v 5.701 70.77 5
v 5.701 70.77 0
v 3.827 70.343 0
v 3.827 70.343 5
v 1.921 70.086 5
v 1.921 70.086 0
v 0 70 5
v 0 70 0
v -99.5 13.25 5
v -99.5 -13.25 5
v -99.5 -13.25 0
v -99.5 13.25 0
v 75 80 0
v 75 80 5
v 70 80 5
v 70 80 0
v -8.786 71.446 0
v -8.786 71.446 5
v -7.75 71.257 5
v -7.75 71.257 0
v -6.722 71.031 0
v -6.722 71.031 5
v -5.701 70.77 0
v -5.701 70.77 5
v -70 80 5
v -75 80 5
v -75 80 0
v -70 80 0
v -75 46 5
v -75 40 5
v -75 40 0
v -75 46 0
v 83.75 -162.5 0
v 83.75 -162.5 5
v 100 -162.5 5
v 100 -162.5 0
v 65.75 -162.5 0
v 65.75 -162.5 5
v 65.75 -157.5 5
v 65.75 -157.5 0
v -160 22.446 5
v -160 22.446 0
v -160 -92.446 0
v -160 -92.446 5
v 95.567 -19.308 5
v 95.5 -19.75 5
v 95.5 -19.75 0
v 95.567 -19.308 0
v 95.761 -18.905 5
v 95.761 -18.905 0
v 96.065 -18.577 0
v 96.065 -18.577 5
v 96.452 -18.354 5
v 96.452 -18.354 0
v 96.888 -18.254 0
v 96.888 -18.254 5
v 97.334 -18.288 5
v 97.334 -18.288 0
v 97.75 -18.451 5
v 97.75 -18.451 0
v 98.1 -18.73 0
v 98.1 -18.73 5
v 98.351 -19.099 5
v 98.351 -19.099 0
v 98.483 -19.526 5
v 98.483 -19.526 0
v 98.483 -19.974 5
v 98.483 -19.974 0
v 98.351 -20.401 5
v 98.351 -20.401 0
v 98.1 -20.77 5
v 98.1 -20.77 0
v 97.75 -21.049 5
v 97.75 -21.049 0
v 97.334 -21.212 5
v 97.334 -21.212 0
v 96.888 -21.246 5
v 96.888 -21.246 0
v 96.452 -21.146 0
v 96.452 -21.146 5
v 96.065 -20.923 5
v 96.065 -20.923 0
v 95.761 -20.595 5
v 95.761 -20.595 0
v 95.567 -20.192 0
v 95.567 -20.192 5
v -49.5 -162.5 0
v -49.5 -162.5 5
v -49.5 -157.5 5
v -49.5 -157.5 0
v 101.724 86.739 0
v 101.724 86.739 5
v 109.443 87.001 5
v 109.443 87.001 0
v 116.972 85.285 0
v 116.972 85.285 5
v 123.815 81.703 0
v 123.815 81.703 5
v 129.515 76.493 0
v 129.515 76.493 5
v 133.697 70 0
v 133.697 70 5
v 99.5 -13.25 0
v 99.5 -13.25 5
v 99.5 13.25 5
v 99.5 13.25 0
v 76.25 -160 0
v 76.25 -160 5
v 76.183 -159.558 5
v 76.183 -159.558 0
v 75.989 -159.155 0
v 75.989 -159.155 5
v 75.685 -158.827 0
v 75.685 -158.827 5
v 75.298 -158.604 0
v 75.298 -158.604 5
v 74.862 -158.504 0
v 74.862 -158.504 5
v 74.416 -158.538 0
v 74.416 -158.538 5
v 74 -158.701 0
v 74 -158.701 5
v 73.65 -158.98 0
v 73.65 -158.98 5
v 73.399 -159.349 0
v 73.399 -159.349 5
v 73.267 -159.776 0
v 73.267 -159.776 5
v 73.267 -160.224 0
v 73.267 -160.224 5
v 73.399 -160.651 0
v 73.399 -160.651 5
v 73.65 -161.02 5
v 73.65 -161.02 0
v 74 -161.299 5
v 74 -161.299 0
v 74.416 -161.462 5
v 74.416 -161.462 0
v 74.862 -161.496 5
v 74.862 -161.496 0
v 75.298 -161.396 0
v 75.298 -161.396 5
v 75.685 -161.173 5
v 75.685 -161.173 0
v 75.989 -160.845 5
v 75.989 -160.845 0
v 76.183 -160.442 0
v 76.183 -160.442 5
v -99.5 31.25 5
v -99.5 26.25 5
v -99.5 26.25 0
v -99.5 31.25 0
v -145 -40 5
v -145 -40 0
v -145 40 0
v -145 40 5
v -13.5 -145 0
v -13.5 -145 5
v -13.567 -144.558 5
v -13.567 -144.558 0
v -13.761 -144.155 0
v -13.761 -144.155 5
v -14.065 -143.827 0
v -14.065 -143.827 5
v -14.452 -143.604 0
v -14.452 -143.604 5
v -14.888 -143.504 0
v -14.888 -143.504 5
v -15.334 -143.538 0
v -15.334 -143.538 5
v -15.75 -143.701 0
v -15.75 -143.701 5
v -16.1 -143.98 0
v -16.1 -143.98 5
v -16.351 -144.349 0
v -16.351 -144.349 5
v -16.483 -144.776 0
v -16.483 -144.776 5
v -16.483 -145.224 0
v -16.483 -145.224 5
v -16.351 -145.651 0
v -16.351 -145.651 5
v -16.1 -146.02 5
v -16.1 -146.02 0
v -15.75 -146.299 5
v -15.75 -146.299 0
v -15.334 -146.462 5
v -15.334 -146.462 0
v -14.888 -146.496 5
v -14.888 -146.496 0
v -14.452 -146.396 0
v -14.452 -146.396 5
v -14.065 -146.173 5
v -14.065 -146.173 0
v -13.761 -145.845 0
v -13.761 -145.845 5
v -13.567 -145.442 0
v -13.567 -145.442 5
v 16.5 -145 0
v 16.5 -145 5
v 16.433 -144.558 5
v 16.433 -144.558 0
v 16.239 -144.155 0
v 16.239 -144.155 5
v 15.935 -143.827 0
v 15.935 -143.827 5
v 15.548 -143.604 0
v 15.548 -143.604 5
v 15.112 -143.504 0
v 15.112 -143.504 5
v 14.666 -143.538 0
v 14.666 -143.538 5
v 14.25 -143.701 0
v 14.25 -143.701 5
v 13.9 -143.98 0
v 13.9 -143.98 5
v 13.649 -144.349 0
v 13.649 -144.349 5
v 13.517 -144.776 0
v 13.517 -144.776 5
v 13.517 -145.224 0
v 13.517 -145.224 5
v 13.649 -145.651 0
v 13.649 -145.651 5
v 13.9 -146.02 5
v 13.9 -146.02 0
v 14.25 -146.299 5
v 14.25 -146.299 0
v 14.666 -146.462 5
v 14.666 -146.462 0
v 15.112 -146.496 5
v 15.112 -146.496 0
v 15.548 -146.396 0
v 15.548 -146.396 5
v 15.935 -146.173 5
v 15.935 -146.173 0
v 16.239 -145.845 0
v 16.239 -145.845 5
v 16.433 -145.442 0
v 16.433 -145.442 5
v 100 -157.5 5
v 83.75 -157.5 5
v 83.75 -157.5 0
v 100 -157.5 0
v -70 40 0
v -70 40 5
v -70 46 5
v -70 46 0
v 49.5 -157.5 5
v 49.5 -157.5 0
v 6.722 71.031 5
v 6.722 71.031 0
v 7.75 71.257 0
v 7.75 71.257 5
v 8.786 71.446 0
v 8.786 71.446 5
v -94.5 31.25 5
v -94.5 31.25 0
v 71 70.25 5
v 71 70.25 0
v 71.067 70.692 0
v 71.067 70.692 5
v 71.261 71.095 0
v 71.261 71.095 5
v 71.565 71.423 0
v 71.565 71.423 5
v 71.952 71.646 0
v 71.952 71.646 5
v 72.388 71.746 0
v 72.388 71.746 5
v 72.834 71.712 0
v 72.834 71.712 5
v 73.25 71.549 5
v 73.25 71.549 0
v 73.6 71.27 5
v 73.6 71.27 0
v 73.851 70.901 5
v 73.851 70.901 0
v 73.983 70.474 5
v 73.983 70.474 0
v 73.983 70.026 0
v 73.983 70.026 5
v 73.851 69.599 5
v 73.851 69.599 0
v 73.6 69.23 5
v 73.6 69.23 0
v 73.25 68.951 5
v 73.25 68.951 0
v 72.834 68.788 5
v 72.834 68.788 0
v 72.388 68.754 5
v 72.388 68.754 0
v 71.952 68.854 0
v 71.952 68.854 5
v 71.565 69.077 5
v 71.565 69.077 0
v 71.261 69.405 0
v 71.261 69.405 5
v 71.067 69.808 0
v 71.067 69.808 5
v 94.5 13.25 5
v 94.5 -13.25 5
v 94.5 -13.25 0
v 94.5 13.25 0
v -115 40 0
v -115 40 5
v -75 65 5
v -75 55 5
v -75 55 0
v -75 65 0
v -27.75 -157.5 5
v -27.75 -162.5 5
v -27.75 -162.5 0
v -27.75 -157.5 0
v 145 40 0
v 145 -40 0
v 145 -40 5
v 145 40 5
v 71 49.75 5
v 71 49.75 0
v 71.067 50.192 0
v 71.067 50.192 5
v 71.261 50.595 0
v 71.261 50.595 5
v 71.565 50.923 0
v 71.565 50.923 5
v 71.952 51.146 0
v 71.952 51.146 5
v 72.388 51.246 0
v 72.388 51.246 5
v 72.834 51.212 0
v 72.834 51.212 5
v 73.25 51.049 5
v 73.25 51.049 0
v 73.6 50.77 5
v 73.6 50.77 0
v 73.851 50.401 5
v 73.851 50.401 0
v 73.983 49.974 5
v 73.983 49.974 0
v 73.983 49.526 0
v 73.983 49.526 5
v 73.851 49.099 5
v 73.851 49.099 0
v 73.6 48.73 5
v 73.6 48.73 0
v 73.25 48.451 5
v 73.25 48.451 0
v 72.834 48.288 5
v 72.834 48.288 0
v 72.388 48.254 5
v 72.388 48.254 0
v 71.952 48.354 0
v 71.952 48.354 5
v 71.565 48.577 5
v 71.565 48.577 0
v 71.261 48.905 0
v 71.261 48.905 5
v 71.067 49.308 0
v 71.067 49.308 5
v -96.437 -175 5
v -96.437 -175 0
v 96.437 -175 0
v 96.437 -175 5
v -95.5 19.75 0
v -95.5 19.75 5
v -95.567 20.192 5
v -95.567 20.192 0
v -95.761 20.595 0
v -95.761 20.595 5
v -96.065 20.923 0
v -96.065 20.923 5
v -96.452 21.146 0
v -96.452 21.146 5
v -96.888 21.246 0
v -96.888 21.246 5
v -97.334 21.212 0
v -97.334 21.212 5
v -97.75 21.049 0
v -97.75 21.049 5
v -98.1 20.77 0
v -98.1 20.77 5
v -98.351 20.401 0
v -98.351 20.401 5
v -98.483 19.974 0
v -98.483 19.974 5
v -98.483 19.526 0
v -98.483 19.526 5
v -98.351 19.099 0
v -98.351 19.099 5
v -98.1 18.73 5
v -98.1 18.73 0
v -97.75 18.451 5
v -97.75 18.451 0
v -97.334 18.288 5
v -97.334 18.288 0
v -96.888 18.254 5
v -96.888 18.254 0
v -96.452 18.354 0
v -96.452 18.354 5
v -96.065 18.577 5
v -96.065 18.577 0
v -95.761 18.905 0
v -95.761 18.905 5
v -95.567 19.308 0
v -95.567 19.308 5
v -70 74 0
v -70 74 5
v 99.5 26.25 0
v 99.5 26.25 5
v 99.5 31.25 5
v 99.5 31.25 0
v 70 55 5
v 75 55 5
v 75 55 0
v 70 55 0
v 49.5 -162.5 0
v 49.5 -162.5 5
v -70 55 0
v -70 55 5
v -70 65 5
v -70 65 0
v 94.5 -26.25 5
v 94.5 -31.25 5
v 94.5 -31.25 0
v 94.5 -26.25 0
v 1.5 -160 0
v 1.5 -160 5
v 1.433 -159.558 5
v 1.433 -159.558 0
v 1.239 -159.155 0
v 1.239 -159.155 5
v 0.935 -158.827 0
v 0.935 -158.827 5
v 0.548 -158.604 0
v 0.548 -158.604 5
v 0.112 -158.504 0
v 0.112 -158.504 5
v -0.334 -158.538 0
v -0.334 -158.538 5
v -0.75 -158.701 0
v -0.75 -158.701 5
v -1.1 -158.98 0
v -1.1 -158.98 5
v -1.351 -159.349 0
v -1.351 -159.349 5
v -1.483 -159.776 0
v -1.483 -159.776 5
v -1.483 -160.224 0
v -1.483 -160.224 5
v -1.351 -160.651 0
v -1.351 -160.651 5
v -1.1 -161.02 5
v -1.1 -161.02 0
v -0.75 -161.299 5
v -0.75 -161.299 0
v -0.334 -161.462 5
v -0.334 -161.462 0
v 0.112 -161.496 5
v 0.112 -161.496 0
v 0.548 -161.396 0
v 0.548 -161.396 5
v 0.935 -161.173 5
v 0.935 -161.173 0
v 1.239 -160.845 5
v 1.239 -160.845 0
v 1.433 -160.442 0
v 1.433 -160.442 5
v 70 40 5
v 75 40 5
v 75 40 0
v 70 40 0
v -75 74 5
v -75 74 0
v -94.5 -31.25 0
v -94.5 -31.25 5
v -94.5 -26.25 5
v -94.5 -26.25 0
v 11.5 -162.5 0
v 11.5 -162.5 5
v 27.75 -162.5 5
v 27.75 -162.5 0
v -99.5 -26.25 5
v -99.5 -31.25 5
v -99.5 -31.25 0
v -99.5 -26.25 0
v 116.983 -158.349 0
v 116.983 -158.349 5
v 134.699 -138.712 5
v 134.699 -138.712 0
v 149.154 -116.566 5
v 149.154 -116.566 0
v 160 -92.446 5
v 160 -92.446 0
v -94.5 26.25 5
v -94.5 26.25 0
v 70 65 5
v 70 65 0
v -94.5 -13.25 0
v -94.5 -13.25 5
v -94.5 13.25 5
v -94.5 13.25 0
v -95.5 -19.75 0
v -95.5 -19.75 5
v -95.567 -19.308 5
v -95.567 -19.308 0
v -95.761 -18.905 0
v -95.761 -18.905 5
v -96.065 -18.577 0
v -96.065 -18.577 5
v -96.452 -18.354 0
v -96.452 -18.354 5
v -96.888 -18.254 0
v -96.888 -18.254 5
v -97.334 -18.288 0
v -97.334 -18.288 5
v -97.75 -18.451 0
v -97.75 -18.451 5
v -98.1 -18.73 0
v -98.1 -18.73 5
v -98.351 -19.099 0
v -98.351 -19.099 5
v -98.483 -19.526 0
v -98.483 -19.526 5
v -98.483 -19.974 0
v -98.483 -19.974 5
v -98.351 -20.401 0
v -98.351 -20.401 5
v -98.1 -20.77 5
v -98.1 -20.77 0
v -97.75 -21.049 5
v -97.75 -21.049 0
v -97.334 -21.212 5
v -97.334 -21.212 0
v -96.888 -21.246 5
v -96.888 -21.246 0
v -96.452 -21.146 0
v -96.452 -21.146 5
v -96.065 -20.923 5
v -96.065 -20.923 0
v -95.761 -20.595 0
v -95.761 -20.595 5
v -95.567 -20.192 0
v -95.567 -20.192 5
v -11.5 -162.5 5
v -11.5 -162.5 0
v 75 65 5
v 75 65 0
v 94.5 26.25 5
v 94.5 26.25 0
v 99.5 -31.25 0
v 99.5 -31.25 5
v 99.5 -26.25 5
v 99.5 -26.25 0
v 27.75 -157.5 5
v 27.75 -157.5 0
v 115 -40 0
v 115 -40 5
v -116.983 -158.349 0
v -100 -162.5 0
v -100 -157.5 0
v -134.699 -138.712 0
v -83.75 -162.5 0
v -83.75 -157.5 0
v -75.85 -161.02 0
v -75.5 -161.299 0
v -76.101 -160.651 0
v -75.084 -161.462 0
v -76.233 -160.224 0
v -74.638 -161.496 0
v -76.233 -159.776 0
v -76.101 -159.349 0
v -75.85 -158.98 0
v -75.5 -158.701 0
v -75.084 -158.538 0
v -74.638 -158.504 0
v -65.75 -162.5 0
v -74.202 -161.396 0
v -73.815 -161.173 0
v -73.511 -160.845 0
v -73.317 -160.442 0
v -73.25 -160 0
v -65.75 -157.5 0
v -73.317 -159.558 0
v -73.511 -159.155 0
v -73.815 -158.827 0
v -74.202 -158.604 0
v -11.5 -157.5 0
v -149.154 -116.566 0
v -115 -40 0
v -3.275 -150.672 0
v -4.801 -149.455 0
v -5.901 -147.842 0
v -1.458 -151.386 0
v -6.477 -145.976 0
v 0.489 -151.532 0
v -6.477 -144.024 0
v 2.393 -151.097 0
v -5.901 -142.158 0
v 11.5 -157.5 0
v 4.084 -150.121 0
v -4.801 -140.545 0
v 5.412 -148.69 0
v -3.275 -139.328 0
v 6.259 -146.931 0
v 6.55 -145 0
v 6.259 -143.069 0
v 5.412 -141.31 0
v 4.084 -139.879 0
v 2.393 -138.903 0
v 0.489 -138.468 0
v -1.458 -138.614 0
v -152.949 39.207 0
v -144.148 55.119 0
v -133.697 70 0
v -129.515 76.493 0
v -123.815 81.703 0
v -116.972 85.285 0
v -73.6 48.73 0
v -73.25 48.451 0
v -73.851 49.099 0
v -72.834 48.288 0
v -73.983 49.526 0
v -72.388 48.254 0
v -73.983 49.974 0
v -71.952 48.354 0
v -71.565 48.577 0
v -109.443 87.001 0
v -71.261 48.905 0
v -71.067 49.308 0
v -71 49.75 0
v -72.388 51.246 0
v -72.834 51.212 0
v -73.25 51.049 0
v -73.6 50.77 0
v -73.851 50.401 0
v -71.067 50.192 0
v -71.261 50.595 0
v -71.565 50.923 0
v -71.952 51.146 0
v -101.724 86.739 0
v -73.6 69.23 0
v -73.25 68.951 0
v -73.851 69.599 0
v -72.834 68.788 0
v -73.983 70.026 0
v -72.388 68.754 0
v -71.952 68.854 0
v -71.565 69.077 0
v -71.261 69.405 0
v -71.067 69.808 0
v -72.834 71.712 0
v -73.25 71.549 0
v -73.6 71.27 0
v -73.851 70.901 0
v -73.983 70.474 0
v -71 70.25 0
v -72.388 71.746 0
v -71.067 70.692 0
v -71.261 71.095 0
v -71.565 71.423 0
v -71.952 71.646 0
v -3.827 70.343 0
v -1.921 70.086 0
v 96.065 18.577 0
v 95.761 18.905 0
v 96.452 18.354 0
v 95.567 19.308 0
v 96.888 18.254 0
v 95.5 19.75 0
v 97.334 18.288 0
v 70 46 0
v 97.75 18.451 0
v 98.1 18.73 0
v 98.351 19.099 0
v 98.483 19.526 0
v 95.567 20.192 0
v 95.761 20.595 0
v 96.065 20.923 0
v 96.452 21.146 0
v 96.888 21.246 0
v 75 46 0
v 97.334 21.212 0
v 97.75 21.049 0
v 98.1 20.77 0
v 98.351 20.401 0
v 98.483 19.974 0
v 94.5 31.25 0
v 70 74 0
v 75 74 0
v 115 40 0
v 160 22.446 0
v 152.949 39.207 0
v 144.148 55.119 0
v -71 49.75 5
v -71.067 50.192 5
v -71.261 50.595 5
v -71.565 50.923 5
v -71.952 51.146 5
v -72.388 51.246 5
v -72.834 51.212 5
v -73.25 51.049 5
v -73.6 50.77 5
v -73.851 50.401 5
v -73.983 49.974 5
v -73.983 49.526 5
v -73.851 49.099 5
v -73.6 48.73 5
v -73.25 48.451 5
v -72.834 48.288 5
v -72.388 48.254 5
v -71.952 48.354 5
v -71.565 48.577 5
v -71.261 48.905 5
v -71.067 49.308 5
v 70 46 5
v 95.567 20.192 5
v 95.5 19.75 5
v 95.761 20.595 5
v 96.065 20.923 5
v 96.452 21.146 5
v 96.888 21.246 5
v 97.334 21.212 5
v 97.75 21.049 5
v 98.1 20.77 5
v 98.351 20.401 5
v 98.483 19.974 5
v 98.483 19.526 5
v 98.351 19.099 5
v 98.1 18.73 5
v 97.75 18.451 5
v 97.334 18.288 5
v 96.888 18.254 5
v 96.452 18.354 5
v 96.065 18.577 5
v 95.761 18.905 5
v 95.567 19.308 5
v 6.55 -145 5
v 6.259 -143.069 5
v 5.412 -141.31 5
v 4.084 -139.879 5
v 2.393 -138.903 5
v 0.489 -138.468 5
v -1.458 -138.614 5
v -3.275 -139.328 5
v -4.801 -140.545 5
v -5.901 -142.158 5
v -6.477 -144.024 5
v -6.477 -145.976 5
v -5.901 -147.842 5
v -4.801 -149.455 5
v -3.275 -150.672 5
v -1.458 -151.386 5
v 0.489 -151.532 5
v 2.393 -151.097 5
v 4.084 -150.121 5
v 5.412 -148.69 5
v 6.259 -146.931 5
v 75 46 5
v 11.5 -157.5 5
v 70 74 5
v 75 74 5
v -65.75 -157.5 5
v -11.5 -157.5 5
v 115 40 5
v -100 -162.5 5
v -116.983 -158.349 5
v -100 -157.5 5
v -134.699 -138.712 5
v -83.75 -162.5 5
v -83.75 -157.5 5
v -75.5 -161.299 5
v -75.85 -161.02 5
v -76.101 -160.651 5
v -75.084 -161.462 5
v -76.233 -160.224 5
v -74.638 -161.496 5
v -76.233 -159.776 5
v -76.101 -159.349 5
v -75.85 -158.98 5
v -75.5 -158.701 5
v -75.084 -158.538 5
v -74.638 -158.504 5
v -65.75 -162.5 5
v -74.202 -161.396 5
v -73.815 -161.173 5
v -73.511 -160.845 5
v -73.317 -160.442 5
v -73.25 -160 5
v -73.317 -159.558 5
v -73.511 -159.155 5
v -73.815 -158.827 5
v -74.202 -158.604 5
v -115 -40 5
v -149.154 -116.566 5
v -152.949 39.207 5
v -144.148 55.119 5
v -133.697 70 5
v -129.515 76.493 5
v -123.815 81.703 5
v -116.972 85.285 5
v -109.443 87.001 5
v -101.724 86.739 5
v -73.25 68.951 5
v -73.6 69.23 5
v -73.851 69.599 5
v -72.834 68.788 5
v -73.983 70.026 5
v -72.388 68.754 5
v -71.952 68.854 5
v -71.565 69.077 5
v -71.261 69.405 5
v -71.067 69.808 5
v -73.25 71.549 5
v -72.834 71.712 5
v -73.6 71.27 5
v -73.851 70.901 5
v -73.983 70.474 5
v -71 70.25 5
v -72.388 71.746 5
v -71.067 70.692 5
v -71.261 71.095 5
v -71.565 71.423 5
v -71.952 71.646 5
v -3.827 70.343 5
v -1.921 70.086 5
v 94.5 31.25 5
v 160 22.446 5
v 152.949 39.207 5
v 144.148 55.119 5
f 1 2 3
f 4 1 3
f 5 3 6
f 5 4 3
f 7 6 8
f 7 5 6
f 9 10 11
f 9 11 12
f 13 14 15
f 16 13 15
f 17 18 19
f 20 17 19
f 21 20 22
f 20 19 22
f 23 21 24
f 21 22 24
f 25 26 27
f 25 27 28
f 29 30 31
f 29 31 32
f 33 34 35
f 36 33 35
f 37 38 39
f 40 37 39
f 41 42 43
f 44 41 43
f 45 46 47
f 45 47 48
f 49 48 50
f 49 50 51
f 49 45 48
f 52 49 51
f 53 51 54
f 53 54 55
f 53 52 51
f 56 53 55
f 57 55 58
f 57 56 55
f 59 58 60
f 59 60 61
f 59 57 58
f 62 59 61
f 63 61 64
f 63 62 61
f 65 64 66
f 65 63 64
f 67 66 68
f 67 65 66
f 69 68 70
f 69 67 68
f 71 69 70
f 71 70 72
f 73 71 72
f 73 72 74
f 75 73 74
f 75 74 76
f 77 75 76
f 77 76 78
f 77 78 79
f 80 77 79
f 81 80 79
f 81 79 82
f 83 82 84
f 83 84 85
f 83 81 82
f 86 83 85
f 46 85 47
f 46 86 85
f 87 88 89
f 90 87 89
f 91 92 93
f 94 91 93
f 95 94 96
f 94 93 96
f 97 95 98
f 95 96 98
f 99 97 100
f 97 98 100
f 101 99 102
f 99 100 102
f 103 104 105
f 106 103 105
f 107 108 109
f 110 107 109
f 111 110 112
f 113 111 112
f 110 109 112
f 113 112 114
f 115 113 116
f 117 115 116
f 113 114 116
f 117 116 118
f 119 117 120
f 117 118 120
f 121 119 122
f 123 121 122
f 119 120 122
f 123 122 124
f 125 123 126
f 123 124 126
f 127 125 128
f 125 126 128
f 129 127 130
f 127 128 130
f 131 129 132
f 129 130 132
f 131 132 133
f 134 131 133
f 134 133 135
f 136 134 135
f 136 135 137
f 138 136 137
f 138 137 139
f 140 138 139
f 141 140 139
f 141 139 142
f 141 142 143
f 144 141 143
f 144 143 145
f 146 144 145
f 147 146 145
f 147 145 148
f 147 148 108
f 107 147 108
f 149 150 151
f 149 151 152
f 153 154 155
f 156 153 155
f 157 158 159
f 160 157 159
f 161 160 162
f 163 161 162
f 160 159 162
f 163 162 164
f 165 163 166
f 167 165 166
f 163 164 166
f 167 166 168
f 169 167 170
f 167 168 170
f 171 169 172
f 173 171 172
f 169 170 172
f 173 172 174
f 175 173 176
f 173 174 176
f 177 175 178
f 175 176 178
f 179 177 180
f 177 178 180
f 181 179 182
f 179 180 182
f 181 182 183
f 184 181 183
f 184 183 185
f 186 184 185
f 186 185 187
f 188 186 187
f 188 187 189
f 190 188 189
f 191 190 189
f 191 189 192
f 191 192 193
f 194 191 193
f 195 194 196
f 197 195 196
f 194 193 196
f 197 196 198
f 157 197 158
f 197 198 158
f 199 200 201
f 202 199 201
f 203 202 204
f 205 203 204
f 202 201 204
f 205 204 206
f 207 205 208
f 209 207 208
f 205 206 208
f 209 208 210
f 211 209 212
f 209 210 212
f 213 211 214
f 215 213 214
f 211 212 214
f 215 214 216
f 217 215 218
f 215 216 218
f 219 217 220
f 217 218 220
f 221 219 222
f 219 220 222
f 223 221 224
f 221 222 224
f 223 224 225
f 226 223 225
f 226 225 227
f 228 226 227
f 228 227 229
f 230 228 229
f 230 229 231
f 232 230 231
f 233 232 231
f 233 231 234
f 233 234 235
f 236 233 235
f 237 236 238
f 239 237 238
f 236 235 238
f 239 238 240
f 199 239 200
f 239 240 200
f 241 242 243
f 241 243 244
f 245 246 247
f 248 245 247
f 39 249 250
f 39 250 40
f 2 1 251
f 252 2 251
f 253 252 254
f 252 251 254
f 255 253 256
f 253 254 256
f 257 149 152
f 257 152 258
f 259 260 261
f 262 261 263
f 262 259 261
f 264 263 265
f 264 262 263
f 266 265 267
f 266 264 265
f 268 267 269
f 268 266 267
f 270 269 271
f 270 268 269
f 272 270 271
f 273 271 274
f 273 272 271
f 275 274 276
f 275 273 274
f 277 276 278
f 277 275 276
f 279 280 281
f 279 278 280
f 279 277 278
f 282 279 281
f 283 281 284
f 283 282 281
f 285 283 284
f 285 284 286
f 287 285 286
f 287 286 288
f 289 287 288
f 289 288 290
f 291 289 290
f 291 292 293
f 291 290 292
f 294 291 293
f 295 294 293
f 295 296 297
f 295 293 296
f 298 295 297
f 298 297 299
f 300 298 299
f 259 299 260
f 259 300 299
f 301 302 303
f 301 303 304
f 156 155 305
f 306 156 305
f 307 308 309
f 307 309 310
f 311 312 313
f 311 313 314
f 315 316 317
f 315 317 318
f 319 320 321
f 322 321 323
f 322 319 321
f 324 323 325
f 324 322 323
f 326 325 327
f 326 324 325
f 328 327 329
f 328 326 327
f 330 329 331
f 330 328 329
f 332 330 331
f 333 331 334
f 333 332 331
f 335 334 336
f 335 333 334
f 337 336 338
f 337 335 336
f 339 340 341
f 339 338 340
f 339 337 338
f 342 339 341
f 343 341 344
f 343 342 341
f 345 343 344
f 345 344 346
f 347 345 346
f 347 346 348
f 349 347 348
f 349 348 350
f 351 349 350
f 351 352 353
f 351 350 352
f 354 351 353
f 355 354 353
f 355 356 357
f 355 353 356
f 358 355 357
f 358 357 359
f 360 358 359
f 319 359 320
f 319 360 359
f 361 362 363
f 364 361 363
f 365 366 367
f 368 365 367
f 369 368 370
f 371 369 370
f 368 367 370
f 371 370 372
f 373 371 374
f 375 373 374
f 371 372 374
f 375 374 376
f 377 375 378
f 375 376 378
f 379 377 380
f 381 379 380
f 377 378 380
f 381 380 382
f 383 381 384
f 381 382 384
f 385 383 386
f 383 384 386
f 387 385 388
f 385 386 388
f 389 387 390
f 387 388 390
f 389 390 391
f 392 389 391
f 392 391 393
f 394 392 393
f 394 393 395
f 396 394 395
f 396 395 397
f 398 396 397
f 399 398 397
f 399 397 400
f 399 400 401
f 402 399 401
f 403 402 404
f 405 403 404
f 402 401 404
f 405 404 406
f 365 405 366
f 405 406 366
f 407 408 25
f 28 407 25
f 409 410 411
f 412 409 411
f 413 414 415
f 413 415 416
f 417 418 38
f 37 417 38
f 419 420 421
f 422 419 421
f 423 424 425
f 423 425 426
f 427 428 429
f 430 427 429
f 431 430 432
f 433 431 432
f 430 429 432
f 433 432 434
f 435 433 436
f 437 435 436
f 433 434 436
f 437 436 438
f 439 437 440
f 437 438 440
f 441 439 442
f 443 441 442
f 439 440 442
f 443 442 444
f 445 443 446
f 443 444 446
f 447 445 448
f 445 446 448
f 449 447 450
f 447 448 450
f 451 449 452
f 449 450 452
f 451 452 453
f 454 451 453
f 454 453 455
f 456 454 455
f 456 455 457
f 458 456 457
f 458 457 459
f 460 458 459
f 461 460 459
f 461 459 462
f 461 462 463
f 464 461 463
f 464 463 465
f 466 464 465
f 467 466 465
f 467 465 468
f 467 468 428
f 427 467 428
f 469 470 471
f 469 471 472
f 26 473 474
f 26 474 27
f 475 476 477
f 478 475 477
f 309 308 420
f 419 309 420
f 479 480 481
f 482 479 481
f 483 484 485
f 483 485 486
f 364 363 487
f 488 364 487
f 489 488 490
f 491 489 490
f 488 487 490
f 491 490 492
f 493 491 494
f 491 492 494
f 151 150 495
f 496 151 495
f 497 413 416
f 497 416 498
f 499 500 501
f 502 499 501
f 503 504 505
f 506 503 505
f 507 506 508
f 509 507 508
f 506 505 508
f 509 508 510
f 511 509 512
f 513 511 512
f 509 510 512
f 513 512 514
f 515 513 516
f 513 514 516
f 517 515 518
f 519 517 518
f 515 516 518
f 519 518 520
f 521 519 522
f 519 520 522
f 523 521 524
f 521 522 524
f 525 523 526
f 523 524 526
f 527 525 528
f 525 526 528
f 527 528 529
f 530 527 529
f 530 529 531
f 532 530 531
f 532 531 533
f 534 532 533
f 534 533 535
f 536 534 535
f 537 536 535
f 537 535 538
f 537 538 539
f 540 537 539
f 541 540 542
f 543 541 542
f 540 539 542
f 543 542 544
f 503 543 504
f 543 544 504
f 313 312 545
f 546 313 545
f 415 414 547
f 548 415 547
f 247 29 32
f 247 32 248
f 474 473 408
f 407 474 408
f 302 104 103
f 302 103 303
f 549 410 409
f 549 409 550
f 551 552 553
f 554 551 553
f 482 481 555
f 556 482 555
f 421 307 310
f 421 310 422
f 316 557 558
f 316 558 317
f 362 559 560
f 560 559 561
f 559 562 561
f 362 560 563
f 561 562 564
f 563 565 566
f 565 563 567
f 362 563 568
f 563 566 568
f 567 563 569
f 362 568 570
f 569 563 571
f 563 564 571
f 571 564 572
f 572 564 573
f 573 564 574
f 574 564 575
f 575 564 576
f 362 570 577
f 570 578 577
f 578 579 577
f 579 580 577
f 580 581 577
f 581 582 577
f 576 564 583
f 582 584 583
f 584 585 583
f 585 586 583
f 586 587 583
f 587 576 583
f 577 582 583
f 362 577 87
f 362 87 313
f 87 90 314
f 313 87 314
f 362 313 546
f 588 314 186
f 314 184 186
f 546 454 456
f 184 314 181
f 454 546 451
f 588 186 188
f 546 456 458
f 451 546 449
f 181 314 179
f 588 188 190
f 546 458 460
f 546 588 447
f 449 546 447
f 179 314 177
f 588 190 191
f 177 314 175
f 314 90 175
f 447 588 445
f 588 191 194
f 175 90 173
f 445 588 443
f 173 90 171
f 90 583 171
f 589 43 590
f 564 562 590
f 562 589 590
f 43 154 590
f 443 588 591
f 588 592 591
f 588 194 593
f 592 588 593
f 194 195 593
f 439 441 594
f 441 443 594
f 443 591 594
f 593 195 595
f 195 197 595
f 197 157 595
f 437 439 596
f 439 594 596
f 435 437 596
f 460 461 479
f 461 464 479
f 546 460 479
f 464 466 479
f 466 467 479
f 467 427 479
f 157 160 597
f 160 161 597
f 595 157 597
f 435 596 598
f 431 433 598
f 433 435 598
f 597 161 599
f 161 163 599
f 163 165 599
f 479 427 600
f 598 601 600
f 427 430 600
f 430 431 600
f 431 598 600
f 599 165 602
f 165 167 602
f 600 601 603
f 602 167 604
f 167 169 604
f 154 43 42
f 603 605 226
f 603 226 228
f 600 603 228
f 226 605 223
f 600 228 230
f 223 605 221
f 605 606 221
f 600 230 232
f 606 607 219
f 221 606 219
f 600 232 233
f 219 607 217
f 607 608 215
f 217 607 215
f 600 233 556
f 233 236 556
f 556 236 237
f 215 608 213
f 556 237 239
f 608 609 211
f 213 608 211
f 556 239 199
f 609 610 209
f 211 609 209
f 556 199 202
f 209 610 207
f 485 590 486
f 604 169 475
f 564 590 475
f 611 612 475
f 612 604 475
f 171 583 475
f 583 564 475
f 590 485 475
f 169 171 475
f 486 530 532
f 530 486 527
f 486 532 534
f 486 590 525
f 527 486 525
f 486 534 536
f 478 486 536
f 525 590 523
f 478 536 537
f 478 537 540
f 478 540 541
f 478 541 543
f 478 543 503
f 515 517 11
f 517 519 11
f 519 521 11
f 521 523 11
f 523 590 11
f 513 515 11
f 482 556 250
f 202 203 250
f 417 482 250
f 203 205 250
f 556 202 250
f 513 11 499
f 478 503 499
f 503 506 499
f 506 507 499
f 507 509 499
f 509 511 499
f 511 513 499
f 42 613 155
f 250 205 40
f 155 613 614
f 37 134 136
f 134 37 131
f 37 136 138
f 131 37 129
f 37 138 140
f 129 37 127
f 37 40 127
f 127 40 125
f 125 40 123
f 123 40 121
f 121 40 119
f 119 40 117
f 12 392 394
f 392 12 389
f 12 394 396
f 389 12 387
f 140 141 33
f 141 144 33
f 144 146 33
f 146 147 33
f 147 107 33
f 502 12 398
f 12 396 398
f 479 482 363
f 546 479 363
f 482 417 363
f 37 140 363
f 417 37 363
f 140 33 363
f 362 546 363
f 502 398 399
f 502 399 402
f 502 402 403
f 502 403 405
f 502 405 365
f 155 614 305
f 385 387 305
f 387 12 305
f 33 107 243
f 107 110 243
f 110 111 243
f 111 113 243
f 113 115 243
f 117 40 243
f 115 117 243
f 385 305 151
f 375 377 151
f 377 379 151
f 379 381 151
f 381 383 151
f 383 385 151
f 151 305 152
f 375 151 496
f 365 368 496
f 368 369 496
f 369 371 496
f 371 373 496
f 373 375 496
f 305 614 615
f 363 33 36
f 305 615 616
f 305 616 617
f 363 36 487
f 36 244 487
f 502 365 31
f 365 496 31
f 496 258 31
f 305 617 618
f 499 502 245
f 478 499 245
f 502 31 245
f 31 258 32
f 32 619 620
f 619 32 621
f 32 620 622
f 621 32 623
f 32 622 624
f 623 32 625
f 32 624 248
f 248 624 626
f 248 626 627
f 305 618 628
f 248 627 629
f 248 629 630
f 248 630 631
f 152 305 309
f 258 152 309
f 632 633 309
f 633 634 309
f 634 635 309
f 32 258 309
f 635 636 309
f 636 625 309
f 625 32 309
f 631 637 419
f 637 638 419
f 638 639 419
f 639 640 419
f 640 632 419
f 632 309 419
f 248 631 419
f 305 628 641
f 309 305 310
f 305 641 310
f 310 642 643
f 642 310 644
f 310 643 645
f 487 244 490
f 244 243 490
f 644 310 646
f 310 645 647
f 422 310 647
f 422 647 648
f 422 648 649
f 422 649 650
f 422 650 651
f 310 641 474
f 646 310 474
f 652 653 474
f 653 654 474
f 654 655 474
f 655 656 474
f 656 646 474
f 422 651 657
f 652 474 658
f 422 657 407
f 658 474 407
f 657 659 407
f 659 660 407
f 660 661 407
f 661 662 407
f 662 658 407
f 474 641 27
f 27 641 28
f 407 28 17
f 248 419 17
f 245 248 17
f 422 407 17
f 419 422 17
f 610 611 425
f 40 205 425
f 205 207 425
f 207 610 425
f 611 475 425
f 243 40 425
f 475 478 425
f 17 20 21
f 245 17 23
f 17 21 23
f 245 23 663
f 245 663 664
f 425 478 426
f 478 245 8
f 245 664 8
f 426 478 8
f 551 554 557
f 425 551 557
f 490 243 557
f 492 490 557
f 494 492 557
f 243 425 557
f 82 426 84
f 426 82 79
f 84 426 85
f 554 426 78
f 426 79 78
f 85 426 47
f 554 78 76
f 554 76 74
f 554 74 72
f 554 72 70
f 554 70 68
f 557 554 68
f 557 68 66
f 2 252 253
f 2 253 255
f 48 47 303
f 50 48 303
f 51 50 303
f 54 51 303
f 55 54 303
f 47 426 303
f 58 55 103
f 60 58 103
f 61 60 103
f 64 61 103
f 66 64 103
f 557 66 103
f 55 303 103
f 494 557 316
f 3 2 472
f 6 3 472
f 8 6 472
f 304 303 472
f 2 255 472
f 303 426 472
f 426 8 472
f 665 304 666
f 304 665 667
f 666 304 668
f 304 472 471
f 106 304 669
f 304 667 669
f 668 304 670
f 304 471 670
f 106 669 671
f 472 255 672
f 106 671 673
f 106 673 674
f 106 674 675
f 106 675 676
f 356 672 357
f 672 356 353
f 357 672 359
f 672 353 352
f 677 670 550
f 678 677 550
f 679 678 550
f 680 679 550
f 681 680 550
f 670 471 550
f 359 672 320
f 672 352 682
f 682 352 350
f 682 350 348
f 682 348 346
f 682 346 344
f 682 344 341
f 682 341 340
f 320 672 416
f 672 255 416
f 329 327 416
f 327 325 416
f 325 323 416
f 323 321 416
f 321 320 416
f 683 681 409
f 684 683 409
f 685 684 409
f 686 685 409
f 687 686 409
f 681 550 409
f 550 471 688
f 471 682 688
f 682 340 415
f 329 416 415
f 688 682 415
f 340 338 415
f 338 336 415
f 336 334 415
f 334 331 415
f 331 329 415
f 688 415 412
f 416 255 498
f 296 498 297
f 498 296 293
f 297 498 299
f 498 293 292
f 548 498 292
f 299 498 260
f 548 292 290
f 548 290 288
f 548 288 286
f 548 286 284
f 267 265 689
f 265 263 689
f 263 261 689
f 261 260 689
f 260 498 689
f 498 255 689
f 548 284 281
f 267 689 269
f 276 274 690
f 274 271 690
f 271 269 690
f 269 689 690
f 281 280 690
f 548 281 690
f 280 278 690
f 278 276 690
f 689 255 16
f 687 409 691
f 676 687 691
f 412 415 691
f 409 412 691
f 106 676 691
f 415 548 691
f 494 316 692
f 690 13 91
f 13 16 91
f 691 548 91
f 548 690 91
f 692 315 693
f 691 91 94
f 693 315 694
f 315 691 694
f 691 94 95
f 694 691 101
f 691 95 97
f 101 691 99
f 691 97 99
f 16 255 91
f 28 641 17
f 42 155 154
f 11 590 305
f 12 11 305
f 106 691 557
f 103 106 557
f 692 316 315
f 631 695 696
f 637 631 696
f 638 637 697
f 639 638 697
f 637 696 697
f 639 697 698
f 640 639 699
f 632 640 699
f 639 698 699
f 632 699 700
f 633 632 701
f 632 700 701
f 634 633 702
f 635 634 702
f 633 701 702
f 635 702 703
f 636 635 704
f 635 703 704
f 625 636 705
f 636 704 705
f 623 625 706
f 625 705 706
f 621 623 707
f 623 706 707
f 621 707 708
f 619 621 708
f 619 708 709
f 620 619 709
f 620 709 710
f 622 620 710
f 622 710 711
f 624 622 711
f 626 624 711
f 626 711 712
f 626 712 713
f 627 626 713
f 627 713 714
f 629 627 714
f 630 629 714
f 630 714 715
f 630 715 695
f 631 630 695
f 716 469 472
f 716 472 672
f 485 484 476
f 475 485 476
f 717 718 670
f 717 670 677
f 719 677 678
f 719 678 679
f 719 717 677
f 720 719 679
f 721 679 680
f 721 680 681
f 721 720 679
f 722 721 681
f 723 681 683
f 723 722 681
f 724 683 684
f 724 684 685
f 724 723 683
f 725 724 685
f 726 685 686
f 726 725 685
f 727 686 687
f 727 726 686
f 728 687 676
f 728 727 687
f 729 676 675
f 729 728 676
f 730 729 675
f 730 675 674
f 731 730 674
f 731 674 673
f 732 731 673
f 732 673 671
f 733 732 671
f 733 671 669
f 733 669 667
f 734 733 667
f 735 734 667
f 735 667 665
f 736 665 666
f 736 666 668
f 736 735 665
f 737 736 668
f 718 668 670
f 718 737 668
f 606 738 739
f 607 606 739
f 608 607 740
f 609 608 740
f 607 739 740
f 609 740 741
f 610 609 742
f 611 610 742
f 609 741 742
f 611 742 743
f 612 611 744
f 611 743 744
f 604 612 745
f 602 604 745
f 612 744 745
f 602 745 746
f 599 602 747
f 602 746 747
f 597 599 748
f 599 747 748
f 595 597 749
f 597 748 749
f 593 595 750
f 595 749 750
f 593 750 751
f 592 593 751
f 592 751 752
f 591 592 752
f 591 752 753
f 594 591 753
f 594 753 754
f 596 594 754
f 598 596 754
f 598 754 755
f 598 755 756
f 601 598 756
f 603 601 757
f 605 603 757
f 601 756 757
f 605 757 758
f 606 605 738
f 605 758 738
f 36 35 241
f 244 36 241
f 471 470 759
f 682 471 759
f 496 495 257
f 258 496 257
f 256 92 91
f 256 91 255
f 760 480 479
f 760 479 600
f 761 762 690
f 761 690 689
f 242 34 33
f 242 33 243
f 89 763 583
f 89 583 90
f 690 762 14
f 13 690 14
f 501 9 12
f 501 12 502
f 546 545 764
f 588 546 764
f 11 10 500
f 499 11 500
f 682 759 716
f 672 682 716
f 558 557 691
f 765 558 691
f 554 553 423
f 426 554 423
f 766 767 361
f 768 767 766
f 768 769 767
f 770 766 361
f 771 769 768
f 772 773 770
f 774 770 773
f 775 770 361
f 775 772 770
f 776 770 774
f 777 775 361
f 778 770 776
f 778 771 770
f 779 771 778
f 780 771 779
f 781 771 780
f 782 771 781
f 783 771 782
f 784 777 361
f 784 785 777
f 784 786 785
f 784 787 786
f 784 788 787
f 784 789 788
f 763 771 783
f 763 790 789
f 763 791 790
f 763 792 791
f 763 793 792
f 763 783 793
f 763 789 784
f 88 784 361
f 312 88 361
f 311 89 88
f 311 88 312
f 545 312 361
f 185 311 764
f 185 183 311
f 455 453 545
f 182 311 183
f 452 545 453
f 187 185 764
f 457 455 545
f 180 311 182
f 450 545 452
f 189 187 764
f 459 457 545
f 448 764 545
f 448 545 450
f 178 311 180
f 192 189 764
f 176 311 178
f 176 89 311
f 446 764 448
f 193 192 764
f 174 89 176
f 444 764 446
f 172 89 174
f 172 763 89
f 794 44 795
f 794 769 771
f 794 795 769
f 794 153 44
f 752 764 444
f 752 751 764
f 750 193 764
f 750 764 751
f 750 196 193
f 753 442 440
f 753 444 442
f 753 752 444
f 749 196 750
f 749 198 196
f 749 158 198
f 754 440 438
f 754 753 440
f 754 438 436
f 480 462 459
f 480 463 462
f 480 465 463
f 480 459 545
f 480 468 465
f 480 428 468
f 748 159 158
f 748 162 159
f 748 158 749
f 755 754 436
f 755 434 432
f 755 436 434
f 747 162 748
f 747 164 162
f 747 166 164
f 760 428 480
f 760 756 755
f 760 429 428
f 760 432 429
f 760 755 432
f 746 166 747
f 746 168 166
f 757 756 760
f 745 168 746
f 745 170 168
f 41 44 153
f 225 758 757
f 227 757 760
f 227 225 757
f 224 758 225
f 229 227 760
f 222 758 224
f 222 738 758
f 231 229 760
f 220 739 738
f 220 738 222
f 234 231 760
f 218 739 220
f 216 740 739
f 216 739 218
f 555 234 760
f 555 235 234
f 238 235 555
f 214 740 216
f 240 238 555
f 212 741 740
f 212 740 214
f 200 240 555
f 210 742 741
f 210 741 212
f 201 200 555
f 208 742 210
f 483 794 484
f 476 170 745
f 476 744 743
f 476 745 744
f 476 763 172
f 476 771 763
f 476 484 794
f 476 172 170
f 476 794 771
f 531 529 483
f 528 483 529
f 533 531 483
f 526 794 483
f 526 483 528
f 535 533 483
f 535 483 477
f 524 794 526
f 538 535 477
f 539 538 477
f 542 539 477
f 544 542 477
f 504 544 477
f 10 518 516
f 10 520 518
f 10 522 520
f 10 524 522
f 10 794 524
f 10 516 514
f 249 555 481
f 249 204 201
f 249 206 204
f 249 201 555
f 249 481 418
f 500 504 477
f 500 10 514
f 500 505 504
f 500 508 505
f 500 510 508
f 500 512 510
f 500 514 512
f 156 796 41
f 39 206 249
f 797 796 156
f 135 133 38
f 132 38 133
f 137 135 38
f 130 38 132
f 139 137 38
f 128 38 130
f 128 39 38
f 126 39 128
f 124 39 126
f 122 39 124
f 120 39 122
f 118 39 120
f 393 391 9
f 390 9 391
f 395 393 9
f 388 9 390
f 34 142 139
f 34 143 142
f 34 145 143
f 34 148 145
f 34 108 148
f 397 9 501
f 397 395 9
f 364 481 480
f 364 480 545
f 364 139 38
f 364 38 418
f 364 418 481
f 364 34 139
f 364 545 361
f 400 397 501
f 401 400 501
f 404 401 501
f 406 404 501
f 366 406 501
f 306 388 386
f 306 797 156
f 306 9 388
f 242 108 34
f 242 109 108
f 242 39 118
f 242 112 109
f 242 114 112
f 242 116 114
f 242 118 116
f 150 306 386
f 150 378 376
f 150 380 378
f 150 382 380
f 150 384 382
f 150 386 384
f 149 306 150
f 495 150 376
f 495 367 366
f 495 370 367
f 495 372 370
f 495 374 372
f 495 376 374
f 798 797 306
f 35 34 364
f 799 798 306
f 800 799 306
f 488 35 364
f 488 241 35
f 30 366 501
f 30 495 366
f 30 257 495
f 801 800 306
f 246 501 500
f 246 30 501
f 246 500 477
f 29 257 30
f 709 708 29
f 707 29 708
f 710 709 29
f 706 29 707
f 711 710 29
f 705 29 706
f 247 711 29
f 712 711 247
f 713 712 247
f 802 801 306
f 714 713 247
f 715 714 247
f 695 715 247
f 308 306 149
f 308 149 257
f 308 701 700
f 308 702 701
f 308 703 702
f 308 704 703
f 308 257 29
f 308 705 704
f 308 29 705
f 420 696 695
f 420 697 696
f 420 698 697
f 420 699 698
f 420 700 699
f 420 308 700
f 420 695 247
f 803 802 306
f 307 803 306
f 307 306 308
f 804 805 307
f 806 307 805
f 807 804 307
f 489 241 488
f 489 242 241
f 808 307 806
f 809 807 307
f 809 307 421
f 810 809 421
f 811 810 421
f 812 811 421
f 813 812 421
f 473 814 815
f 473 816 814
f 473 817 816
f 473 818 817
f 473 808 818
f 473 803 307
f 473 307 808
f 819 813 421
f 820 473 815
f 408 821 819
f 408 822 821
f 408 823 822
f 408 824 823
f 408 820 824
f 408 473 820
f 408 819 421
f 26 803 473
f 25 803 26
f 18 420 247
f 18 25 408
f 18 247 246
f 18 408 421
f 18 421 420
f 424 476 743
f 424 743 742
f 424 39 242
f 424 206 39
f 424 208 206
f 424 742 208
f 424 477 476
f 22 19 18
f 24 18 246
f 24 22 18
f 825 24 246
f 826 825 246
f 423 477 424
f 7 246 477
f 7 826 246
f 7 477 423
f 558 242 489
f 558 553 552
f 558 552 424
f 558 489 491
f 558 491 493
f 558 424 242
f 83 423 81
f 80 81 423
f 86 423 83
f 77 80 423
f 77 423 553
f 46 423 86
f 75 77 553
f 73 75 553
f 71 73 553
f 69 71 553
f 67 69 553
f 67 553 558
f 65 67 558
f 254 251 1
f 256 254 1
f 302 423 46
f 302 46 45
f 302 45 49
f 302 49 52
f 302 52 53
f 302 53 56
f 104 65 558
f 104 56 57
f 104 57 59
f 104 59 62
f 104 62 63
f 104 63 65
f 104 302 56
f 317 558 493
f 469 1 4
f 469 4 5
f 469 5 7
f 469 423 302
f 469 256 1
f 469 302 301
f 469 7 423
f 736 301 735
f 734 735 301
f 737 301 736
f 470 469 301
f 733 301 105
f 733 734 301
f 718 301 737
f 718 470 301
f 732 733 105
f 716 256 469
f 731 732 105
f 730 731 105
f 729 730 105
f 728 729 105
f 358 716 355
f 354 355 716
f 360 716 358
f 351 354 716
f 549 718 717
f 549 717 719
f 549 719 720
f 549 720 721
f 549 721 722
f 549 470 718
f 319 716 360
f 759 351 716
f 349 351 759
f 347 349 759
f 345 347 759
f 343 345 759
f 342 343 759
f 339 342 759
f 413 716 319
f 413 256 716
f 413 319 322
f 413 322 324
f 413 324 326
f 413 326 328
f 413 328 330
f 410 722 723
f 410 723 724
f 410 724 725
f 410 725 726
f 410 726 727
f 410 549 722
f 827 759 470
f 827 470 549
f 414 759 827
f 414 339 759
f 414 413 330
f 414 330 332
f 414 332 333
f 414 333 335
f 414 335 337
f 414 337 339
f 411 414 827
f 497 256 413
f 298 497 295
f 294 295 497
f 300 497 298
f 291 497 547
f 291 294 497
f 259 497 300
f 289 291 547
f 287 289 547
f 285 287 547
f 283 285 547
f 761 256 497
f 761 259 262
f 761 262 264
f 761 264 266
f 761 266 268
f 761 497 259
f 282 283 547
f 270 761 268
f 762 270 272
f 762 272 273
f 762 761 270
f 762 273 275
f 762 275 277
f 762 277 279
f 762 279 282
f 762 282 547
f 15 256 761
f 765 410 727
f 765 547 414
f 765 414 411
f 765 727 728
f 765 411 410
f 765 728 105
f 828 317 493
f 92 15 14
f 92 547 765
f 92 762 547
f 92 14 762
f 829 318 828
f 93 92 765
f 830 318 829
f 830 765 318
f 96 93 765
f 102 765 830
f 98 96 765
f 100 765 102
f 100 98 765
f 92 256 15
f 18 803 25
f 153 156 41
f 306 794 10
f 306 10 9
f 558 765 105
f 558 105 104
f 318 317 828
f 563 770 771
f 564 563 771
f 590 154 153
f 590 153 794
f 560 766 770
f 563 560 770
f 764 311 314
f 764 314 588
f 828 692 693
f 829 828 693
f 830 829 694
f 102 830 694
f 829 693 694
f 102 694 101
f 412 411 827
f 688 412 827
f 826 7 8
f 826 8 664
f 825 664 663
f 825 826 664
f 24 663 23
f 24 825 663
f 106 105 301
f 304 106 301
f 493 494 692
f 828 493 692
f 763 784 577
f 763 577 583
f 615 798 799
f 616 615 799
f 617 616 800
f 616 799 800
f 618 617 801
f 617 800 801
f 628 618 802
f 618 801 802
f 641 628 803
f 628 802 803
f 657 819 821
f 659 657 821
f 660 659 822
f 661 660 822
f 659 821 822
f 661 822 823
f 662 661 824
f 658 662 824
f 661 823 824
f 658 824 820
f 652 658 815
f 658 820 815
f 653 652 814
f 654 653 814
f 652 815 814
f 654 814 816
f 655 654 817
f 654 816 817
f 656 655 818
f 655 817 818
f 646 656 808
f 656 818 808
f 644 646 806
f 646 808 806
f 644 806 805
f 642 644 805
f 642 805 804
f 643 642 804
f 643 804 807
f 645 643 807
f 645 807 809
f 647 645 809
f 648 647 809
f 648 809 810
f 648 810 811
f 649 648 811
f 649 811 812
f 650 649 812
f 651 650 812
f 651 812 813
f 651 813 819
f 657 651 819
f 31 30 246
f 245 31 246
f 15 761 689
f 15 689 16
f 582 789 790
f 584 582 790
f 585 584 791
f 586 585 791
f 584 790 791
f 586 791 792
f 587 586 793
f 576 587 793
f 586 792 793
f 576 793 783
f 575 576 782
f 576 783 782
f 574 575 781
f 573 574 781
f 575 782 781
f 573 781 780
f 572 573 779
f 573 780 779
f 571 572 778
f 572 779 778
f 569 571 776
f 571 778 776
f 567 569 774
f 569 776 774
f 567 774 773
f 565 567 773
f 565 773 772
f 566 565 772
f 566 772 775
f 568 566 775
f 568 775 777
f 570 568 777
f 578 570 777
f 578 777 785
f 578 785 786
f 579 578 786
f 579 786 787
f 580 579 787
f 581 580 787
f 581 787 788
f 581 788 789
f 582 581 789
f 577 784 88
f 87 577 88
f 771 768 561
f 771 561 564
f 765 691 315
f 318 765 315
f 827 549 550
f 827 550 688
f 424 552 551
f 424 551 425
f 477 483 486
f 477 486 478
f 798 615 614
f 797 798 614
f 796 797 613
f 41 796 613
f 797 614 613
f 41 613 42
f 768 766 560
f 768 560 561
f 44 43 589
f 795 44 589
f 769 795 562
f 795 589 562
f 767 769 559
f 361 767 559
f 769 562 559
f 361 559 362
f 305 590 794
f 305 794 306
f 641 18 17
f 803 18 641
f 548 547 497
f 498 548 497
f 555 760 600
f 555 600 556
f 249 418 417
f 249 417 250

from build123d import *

# Parameters (mm, degrees)
SKETCH1_W           = 30
SKETCH1_H           = 80
BOSS_EXTRUDE1_DEPTH = 5
SKETCH2_W           = 5
SKETCH2_H           = 26.5
SKETCH2_H_2         = 5
SKETCH2_R           = 1.5
CUT_EXTRUDE1_DEPTH  = 5
BOSS_EXTRUDE2_DEPTH = 5
FILLET1_R           = 30
SKETCH5_R           = 6.55
SKETCH5_R_2         = 1.5
CUT_EXTRUDE2_DEPTH  = 5
SKETCH6_W           = 16.25
SKETCH6_H           = 5
SKETCH6_R           = 1.5
CUT_EXTRUDE3_DEPTH  = 10
SKETCH7_W           = 5
SKETCH7_H           = 5.5
SKETCH7_H_2         = 10
SKETCH7_H_3         = 6
SKETCH7_R           = 1.5
CUT_EXTRUDE4_DEPTH  = 10
SKETCH8_W           = 5.078430198
SKETCH8_H           = 27.315407993
SKETCH8_W_2         = 5
SKETCH8_H_2         = 26.5
BOSS_EXTRUDE4_DEPTH = 5


with BuildPart() as part:
    # Sketch1 → Boss-Extrude1 (new body)
    with BuildSketch(Plane.XY):
        with BuildLine():
            Line((133.697419571, 70), (-133.697419571, 70))
            ThreePointArc((-133.697419571, 70), (-148.761211935, 47.280628484), (-160, 22.445626465))
            Line((-160, 22.445626465), (-160, -92.445626465))
            ThreePointArc((-160, -92.445626465), (-134.69865165, -138.712454622), (-96.43650761, -175))
            Line((-96.43650761, -175), (96.43650761, -175))
            ThreePointArc((96.43650761, -175), (134.69865165, -138.712454622), (160, -92.445626465))
            Line((160, -92.445626465), (160, 22.445626465))
            ThreePointArc((160, 22.445626465), (148.761211935, 47.280628484), (133.697419571, 70))
        make_face()
        with Locations((-130, 0)):
            Rectangle(SKETCH1_W, SKETCH1_H, mode=Mode.SUBTRACT)
        with Locations((130, 0)):
            Rectangle(SKETCH1_W, SKETCH1_H, mode=Mode.SUBTRACT)
    extrude(amount=BOSS_EXTRUDE1_DEPTH)

    # Sketch2 → Cut-Extrude1 (cut)
    with BuildSketch(Plane.XY.offset(5)):
        with Locations((-97, 0)):
            Rectangle(SKETCH2_W, SKETCH2_H)
        with Locations((-97, 28.75)):
            Rectangle(SKETCH2_W, SKETCH2_H_2)
        with Locations((-97, -28.75)):
            Rectangle(SKETCH2_W, SKETCH2_H_2)
        with Locations((-97, -19.75)):
            Circle(SKETCH2_R)
        with Locations((-97, 19.75)):
            Circle(SKETCH2_R)
    cut_extrude1 = extrude(amount=-CUT_EXTRUDE1_DEPTH, mode=Mode.SUBTRACT)

    # Mirror1: Cut-Extrude1 across plane
    add(cut_extrude1.mirror(Plane(origin=(0, 0, 0), x_dir=(0, 0, 1), z_dir=(1, 0, 0))), mode=Mode.SUBTRACT)

    # Sketch3 → Boss-Extrude2 (add)
    with BuildSketch(Plane.XY.offset(5)):
        with BuildLine():
            ThreePointArc((-2.08e-07, 70), (-3.490893846, 70.285296133), (-6.889142051, 71.133612942))
            Line((-6.889142051, 71.133612942), (-133.697419571, 92))
            Line((-133.697419571, 92), (-133.697419571, 70))
            Line((-133.697419571, 70), (-2.08e-07, 70))
        make_face()
        with BuildLine():
            ThreePointArc((6.889142051, 71.133612942), (3.49089364, 70.285296099), (-2.08e-07, 70))
            Line((-2.08e-07, 70), (133.697419571, 70))
            Line((133.697419571, 70), (133.697419571, 92))
            Line((133.697419571, 92), (6.889142051, 71.133612942))
        make_face()
    extrude(amount=-BOSS_EXTRUDE2_DEPTH)

    # Fillet1
    # the kernel refuses this fillet: 30 mm, written as the material it takes off along each edge
    with BuildSketch(Plane(origin=(-6.889142051, 71.133612942, 9.806082425), x_dir=(-0.9867304131972112, 0.16236715083926523, 0), z_dir=(0, 0, -1))) as fillet1_piece_1:
        with BuildLine():
            CenterArc((1.92243297, -30), FILLET1_R, 90, 6.03368508)
            Line((-1.230961232, -0.166191912), (-1.294029116, 0.430484249))
            ThreePointArc((-1.294029116, 0.430484249), (-0.694557768, 0.502617916), (-0.097420291, 0.592038248))
            Line((-0.097420291, 0.592038248), (0, 0.6))
            Line((0, 0.6), (1.92243297, 0.6))
            Line((1.92243297, 0.6), (1.92243297, 0))
        make_face()
    extrude(amount=14.612164849, mode=Mode.SUBTRACT)
    with BuildSketch(Plane(origin=(6.889142051, 71.133612942, 9.806082425), x_dir=(-0.9561345473491755, -0.29292785351582257, 0), z_dir=(0, 0, -1))) as fillet1_piece_2:
        with BuildLine():
            CenterArc((2.108731211, -29.987480741), FILLET1_R, 91.655317917, 6.03368508)
            Line((-1.905148179, -0.257213803), (-1.985425767, 0.337391536))
            Line((-1.985425767, 0.337391536), (-0.080277588, 0.594605339))
            Line((-0.080277588, 0.594605339), (0.017332037, 0.599749615))
            ThreePointArc((0.017332037, 0.599749615), (0.621064672, 0.591027865), (1.224797306, 0.599749615))
            Line((1.224797306, 0.599749615), (1.242129344, 0))
        make_face()
    extrude(amount=14.612164849, mode=Mode.SUBTRACT)
    with BuildSketch(Plane(origin=(133.697419571, 92, 86.008444254), x_dir=(-0.9867304131972118, -0.16236715083926206, 0), z_dir=(0, 0, -1))) as fillet1_piece_3:
        with BuildLine():
            CenterArc((32.403377702, -30), FILLET1_R, 90, 73.954674896)
            Line((3.572077318, -21.70806909), (2.995451311, -21.542230472))
            ThreePointArc((2.995451311, -21.542230472), (1.194000411, -10.951454836), (-0.592038248, -0.097420291))
            Line((-0.592038248, -0.097420291), (0, 0.6))
            Line((0, 0.6), (32.403377702, 0.6))
            Line((32.403377702, 0.6), (32.403377702, 0))
        make_face()
    extrude(amount=167.016888509, mode=Mode.SUBTRACT)
    with BuildSketch(Plane(origin=(-133.697419571, 92, 86.008444254), x_dir=(0, -1, 0), z_dir=(0, 0, -1))) as fillet1_piece_4:
        with BuildLine():
            CenterArc((34.863156511, -27.102383743), FILLET1_R, 115.389646017, 73.954674896)
            Line((5.261244115, -31.973398269), (4.669205867, -32.070818559))
            Line((4.669205867, -32.070818559), (-0.592038248, -0.097420291))
            Line((-0.592038248, -0.097420291), (0, 0.6))
            ThreePointArc((0, 0.6), (11, 0.6), (21.74273687, 0.542047675))
            Line((21.74273687, 0.542047675), (22, 0))
        make_face()
    extrude(amount=167.016888509, mode=Mode.SUBTRACT)

    # Sketch5 → Cut-Extrude2 (cut)
    with BuildSketch(Plane.XY.offset(5)):
        with Locations((0, -145)):
            Circle(SKETCH5_R)
        with Locations((15, -145)):
            Circle(SKETCH5_R_2)
        with Locations((-15, -145)):
            Circle(SKETCH5_R_2)
    extrude(amount=-CUT_EXTRUDE2_DEPTH, mode=Mode.SUBTRACT)

    # Sketch6 → Cut-Extrude3 (cut)
    with BuildSketch(Plane.XY.offset(5)):
        with Locations((-91.875, -160)):
            Rectangle(SKETCH6_W, SKETCH6_H)
        with Locations((-57.625, -160)):
            Rectangle(SKETCH6_W, SKETCH6_H)
        with Locations((-19.625, -160)):
            Rectangle(SKETCH6_W, SKETCH6_H)
        with Locations((19.625, -160)):
            Rectangle(SKETCH6_W, SKETCH6_H)
        with Locations((57.625, -160)):
            Rectangle(SKETCH6_W, SKETCH6_H)
        with Locations((91.875, -160)):
            Rectangle(SKETCH6_W, SKETCH6_H)
        with Locations((0, -160)):
            Circle(SKETCH6_R)
        with Locations((-74.75, -160)):
            Circle(SKETCH6_R)
        with Locations((74.75, -160)):
            Circle(SKETCH6_R)
    extrude(amount=-CUT_EXTRUDE3_DEPTH, mode=Mode.SUBTRACT)

    # Sketch7 → Cut-Extrude4 (cut)
    with BuildSketch(Plane.XY.offset(5)):
        with Locations((-37.5, 69.75)):
            Rectangle(SKETCH7_W, SKETCH7_H)
        with Locations((-37.5, 51)):
            Rectangle(SKETCH7_W, SKETCH7_H_2)
        with Locations((-72.5, 60)):
            Rectangle(SKETCH7_W, SKETCH7_H_2)
        with Locations((-72.5, 77)):
            Rectangle(SKETCH7_W, SKETCH7_H_3)
        with Locations((-72.5, 43)):
            Rectangle(SKETCH7_W, SKETCH7_H_3)
        with Locations((-37.5, 62.5)):
            Circle(SKETCH7_R)
        with Locations((-72.5, 70.25)):
            Circle(SKETCH7_R)
        with Locations((-72.5, 49.75)):
            Circle(SKETCH7_R)
    cut_extrude4 = extrude(amount=-CUT_EXTRUDE4_DEPTH, mode=Mode.SUBTRACT)

    # Mirror2: Cut-Extrude4 across plane
    add(cut_extrude4.mirror(Plane(origin=(0, 0, 0), x_dir=(0, 0, 1), z_dir=(1, 0, 0))), mode=Mode.SUBTRACT)

    # Sketch8 → Boss-Extrude4 (add)
    with BuildSketch(Plane.XY.offset(5)):
        with Locations((-37.539215099, 59.657703997)):
            Rectangle(SKETCH8_W, SKETCH8_H)
        with Locations((37.5, 59.25)):
            Rectangle(SKETCH8_W_2, SKETCH8_H_2)
    extrude(amount=-BOSS_EXTRUDE4_DEPTH)


solid = part.part
